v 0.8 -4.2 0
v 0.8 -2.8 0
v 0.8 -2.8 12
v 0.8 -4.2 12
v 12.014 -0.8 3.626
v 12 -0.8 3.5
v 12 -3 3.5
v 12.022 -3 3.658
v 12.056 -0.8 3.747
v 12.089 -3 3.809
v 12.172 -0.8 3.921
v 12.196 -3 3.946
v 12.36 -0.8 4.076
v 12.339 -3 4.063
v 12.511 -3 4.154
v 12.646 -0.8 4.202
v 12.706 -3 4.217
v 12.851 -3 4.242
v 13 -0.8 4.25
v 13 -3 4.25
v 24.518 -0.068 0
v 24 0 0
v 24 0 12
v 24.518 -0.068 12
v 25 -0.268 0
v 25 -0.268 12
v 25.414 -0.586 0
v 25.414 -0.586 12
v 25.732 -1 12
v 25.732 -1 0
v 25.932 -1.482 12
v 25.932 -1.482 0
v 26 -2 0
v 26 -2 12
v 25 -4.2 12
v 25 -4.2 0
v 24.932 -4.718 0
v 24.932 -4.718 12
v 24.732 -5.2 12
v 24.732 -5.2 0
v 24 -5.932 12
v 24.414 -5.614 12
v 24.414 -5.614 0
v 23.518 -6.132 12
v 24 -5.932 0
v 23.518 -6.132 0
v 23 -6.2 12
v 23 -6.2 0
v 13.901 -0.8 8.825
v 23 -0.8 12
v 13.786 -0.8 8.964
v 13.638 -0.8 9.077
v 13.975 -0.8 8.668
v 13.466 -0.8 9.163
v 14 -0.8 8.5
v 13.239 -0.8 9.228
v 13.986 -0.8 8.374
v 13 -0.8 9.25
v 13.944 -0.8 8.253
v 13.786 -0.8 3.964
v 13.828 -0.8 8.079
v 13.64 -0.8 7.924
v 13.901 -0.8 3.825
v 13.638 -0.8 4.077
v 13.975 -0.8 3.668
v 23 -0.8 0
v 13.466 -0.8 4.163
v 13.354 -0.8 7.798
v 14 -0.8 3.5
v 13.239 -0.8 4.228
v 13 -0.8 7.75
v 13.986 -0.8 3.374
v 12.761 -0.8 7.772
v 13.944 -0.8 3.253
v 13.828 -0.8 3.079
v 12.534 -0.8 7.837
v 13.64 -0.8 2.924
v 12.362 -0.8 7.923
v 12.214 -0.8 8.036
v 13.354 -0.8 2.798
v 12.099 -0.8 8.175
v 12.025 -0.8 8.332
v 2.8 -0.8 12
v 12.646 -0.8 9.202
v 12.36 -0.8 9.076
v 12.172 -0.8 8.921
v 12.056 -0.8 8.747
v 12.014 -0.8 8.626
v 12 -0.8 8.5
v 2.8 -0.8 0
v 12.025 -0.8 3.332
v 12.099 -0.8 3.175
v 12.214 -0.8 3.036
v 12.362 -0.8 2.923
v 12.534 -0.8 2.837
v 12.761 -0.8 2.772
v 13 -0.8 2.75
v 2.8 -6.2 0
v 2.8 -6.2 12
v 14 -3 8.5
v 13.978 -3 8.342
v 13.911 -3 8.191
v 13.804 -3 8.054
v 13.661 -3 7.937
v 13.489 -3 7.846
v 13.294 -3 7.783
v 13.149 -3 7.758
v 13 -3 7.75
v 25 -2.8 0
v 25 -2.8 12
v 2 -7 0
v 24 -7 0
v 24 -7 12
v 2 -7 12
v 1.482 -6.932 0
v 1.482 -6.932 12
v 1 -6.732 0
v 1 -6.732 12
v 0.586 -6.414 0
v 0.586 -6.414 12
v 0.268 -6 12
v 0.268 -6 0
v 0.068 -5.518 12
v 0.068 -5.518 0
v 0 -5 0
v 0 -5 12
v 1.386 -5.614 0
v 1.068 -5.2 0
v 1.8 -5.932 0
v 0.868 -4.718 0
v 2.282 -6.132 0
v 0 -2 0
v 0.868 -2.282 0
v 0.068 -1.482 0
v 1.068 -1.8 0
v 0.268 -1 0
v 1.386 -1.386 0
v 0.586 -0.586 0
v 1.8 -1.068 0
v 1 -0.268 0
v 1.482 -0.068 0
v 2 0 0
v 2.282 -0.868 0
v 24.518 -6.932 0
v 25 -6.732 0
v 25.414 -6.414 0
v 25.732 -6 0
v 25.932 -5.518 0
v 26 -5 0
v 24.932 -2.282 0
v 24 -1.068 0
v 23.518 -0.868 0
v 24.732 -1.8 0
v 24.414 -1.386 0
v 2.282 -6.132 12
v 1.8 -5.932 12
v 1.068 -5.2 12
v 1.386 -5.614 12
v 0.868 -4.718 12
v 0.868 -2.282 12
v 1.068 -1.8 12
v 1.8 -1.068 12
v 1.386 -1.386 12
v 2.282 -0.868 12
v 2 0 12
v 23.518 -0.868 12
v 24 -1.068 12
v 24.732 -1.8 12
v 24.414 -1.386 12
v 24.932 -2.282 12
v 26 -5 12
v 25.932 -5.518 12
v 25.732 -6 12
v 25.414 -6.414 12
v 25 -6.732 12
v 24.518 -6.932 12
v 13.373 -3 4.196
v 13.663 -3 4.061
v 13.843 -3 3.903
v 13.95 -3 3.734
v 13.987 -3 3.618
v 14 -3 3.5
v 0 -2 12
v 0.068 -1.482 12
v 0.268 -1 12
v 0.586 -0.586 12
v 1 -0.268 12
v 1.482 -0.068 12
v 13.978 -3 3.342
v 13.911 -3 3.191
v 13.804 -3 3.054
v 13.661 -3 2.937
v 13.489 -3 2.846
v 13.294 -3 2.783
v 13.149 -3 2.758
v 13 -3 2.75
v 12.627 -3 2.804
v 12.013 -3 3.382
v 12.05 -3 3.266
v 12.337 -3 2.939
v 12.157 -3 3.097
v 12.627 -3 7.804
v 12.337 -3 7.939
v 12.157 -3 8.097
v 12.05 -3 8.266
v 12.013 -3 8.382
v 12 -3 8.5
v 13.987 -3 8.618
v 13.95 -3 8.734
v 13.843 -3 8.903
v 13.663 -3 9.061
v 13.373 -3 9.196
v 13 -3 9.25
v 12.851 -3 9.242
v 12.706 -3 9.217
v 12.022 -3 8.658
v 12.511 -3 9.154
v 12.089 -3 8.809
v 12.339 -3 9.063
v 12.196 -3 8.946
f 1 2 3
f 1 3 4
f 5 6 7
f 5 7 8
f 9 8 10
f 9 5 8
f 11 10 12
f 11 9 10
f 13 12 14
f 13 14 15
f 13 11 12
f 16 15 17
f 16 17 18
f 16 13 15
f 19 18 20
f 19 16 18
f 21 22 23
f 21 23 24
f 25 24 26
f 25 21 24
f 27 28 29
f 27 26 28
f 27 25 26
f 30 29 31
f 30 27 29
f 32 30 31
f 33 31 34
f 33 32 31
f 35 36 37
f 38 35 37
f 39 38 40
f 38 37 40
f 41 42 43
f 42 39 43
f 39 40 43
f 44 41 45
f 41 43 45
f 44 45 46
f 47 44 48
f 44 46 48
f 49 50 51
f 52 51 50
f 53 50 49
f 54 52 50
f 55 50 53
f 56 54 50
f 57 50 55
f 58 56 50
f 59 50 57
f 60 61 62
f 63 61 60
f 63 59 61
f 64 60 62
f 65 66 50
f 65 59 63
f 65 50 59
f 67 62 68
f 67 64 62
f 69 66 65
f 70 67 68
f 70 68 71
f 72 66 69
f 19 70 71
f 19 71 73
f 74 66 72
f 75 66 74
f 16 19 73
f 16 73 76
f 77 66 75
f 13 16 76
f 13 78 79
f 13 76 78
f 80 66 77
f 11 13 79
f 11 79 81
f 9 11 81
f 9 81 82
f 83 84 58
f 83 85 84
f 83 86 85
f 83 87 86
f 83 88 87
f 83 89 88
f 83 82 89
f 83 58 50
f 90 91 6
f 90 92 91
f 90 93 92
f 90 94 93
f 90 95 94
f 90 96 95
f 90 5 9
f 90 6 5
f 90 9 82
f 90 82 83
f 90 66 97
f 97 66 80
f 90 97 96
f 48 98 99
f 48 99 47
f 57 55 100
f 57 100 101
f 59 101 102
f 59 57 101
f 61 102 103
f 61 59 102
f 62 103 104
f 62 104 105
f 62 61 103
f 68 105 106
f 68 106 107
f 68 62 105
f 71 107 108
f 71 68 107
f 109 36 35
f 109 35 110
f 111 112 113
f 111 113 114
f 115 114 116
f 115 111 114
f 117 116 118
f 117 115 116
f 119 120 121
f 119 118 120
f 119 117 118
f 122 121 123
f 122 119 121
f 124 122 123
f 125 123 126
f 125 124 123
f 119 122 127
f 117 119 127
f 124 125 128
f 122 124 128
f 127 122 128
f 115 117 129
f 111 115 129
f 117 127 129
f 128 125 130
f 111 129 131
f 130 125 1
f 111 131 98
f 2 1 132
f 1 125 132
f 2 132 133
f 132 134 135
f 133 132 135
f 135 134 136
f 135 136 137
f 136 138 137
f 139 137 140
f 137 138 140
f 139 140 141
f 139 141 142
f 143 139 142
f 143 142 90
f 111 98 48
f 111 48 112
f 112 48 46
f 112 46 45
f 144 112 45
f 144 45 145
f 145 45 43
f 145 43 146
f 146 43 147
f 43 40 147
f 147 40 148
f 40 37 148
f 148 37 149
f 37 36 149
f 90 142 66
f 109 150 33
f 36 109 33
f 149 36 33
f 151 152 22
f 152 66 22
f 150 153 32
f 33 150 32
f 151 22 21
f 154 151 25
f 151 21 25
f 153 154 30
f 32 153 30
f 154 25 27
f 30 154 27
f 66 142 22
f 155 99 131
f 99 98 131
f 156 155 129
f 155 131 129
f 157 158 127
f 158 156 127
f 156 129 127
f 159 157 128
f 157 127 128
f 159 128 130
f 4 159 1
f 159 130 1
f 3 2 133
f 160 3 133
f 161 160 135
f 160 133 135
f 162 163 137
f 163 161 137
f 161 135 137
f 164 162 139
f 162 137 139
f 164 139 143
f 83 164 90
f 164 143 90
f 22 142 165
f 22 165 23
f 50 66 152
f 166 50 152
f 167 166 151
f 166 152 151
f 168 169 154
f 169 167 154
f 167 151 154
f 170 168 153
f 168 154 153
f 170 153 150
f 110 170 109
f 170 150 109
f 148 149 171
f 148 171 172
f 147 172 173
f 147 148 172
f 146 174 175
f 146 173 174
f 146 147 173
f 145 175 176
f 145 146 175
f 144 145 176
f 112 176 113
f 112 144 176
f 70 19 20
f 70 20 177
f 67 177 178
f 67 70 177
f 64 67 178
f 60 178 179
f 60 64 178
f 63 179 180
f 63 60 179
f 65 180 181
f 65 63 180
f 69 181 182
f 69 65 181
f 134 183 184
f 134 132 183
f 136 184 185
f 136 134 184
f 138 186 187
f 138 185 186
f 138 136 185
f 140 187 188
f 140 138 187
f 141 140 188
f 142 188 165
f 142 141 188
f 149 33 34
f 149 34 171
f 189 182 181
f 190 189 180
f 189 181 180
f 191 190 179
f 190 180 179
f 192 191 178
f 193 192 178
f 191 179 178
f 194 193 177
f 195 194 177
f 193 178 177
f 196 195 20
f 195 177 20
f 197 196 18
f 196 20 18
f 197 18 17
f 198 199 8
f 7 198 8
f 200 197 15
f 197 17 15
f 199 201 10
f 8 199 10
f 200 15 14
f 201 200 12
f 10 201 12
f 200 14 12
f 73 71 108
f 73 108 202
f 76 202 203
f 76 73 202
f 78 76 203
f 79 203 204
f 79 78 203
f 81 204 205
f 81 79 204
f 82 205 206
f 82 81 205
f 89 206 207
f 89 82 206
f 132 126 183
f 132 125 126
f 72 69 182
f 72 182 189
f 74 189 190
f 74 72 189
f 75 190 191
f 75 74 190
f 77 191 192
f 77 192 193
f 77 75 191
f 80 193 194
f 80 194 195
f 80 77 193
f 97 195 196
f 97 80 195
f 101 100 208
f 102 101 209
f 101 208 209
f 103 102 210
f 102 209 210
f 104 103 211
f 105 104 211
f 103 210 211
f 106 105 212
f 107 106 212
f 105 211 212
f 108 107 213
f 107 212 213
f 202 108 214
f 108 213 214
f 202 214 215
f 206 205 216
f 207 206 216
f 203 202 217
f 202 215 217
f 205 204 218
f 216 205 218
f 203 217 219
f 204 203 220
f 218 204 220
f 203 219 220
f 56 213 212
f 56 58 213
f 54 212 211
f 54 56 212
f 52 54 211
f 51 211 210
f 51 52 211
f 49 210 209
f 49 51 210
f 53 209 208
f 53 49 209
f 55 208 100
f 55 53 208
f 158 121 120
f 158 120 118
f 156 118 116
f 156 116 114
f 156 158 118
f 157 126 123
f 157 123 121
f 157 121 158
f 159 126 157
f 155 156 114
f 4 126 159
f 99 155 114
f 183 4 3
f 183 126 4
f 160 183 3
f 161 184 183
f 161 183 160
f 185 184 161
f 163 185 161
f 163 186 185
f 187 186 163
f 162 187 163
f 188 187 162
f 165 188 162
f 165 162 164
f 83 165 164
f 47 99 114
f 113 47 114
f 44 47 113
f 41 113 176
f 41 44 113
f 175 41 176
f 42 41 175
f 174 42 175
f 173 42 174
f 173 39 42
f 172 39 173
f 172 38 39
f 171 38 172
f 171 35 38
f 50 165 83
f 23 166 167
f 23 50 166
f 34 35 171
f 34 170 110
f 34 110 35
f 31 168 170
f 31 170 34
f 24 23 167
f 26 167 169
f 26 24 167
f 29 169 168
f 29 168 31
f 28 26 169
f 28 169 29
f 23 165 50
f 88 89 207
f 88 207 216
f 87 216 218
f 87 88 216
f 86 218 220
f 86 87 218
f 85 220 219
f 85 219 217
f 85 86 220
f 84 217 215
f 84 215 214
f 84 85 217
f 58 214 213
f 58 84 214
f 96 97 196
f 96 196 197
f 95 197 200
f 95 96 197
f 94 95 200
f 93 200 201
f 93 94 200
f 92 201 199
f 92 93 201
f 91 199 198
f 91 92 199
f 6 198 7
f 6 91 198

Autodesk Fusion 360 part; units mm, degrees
sketch "Sketch1" plane through (0, 0, 0) normal (0, 0, 1) x (1, 0, 0) in component "WatchStrapBit"
  line L0 (2, 0) -> (24, 0)
  line L1 (26, -2) -> (26, -5)
  line L2 (24, -7) -> (2, -7)
  line L3 (0, -5) -> (0, -2)
  line L4 (23, -0.8) -> (2.8, -0.8)
  line L5 (0.8, -2.8) -> (0.8, -4.2)
  line L6 (2.8, -6.2) -> (23, -6.2)
  line L7 (25, -4.2) -> (25, -2.8)
  arc A0 (25, -2.8) -> (23, -0.8) centre (23, -2.8) ccw
  arc A1 (23, -6.2) -> (25, -4.2) centre (23, -4.2) ccw
  arc A2 (2.8, -0.8) -> (0.8, -2.8) centre (2.8, -2.8) ccw
  arc A3 (0.8, -4.2) -> (2.8, -6.2) centre (2.8, -4.2) ccw
  arc A4 (2, 0) -> (0, -2) centre (2, -2) ccw
  arc A5 (0, -5) -> (2, -7) centre (2, -5) ccw
  arc A6 (24, -7) -> (26, -5) centre (24, -5) ccw
  arc A7 (26, -2) -> (24, 0) centre (24, -2) ccw
  point P0 (26, 0)
  dimension "d1" = 26
  dimension "d2" = 7
  dimension "d3" = 0.8
  dimension "d4" = 0.8
  dimension "d5" = 1
  dimension "d6" = 0.8
  dimension "d7" = 2
extrude "Extrude1" add sketch "Sketch1" along normal blind 12 in component "WatchStrapBit"
sketch "Sketch2" plane through (0, 0, 0) normal (0, 1, 0) x (-1, 0, 0) in component "WatchStrapBit"
  line L0 (-24, 0) -> (-2, 0)
  line L1 (-2, 0) -> (-2, 12)
  line L2 (-2, 12) -> (-24, 12)
  line L3 (-24, 12) -> (-24, 0)
  line L4 (-24, 0) -> (-2, 0)
  line L5 (-2, 12) -> (-24, 12)
  line L6 (0, 0) -> (-2, 0)
  line L7 (0, 12) -> (-2, 12)
  line L8 (0, 0) -> (0, 12)
  line L9 (-26, 0) -> (-26, 12)
  line L10 (-24, 0) -> (-26, 0)
  line L11 (-24, 12) -> (-26, 12)
  line L12 (0, 0) -> (-26, 0) construction
  line L13 (0, 12) -> (-26, 12) construction
  line L14 (-13, 0) -> (-13, 12) construction
  line L15 (-13, 6) -> (-13, 3.5)
  line L16 (-13, 6) -> (-13, 8.5)
  circle A0 centre (-13, 3.5) radius 0.75
  circle A1 centre (-13, 8.5) radius 0.75
  ellipse E0 centre (-13, 3.5) end of major axis (-13, 2.75) minor radius 1
  line L17 (-13, 4.25) -> (-13, 2.75)
  line L18 (-14, 3.5) -> (-12, 3.5)
  ellipse E1 centre (-13, 8.5) end of major axis (-13, 7.75) minor radius 1
  line L19 (-13, 9.25) -> (-13, 7.75)
  line L20 (-14, 8.5) -> (-12, 8.5)
  point P0 (-13, 0)
  point P1 (-13, 12)
  point P2 (-13, 6)
  dimension "d10" = 2.5
  dimension "d11" = 2.5
  dimension "d12" = 1.5
  dimension "d13" = 1.5
  dimension "d16" = 2
  dimension "d17" = 2
extrude "Extrude2" add sketch "Sketch2" against normal blind 3 contours A0 E0 L18 | L15 A0 L17 L18 | L15 A0 L17 L18 | A0 E0 L18 | A1 E1 L20 | L16 A1 L19 L20 | L16 A1 L19 L20 | A1 E1 L20 | A0 L17 L18 | A0 L17 L18 | A0 E0 L18 | A0 E0 L18 | A1 L19 L20 | A1 L19 L20 | A1 E1 L20 | A1 E1 L20 in component "WatchStrapBit"
component "WatchStrapBit" placed x (1, 0, 0) y (0, 1, 0) z (0, 0, 1) at (0, 0, 0)
equation "d4 = d3"
equation "d6 = d3"
